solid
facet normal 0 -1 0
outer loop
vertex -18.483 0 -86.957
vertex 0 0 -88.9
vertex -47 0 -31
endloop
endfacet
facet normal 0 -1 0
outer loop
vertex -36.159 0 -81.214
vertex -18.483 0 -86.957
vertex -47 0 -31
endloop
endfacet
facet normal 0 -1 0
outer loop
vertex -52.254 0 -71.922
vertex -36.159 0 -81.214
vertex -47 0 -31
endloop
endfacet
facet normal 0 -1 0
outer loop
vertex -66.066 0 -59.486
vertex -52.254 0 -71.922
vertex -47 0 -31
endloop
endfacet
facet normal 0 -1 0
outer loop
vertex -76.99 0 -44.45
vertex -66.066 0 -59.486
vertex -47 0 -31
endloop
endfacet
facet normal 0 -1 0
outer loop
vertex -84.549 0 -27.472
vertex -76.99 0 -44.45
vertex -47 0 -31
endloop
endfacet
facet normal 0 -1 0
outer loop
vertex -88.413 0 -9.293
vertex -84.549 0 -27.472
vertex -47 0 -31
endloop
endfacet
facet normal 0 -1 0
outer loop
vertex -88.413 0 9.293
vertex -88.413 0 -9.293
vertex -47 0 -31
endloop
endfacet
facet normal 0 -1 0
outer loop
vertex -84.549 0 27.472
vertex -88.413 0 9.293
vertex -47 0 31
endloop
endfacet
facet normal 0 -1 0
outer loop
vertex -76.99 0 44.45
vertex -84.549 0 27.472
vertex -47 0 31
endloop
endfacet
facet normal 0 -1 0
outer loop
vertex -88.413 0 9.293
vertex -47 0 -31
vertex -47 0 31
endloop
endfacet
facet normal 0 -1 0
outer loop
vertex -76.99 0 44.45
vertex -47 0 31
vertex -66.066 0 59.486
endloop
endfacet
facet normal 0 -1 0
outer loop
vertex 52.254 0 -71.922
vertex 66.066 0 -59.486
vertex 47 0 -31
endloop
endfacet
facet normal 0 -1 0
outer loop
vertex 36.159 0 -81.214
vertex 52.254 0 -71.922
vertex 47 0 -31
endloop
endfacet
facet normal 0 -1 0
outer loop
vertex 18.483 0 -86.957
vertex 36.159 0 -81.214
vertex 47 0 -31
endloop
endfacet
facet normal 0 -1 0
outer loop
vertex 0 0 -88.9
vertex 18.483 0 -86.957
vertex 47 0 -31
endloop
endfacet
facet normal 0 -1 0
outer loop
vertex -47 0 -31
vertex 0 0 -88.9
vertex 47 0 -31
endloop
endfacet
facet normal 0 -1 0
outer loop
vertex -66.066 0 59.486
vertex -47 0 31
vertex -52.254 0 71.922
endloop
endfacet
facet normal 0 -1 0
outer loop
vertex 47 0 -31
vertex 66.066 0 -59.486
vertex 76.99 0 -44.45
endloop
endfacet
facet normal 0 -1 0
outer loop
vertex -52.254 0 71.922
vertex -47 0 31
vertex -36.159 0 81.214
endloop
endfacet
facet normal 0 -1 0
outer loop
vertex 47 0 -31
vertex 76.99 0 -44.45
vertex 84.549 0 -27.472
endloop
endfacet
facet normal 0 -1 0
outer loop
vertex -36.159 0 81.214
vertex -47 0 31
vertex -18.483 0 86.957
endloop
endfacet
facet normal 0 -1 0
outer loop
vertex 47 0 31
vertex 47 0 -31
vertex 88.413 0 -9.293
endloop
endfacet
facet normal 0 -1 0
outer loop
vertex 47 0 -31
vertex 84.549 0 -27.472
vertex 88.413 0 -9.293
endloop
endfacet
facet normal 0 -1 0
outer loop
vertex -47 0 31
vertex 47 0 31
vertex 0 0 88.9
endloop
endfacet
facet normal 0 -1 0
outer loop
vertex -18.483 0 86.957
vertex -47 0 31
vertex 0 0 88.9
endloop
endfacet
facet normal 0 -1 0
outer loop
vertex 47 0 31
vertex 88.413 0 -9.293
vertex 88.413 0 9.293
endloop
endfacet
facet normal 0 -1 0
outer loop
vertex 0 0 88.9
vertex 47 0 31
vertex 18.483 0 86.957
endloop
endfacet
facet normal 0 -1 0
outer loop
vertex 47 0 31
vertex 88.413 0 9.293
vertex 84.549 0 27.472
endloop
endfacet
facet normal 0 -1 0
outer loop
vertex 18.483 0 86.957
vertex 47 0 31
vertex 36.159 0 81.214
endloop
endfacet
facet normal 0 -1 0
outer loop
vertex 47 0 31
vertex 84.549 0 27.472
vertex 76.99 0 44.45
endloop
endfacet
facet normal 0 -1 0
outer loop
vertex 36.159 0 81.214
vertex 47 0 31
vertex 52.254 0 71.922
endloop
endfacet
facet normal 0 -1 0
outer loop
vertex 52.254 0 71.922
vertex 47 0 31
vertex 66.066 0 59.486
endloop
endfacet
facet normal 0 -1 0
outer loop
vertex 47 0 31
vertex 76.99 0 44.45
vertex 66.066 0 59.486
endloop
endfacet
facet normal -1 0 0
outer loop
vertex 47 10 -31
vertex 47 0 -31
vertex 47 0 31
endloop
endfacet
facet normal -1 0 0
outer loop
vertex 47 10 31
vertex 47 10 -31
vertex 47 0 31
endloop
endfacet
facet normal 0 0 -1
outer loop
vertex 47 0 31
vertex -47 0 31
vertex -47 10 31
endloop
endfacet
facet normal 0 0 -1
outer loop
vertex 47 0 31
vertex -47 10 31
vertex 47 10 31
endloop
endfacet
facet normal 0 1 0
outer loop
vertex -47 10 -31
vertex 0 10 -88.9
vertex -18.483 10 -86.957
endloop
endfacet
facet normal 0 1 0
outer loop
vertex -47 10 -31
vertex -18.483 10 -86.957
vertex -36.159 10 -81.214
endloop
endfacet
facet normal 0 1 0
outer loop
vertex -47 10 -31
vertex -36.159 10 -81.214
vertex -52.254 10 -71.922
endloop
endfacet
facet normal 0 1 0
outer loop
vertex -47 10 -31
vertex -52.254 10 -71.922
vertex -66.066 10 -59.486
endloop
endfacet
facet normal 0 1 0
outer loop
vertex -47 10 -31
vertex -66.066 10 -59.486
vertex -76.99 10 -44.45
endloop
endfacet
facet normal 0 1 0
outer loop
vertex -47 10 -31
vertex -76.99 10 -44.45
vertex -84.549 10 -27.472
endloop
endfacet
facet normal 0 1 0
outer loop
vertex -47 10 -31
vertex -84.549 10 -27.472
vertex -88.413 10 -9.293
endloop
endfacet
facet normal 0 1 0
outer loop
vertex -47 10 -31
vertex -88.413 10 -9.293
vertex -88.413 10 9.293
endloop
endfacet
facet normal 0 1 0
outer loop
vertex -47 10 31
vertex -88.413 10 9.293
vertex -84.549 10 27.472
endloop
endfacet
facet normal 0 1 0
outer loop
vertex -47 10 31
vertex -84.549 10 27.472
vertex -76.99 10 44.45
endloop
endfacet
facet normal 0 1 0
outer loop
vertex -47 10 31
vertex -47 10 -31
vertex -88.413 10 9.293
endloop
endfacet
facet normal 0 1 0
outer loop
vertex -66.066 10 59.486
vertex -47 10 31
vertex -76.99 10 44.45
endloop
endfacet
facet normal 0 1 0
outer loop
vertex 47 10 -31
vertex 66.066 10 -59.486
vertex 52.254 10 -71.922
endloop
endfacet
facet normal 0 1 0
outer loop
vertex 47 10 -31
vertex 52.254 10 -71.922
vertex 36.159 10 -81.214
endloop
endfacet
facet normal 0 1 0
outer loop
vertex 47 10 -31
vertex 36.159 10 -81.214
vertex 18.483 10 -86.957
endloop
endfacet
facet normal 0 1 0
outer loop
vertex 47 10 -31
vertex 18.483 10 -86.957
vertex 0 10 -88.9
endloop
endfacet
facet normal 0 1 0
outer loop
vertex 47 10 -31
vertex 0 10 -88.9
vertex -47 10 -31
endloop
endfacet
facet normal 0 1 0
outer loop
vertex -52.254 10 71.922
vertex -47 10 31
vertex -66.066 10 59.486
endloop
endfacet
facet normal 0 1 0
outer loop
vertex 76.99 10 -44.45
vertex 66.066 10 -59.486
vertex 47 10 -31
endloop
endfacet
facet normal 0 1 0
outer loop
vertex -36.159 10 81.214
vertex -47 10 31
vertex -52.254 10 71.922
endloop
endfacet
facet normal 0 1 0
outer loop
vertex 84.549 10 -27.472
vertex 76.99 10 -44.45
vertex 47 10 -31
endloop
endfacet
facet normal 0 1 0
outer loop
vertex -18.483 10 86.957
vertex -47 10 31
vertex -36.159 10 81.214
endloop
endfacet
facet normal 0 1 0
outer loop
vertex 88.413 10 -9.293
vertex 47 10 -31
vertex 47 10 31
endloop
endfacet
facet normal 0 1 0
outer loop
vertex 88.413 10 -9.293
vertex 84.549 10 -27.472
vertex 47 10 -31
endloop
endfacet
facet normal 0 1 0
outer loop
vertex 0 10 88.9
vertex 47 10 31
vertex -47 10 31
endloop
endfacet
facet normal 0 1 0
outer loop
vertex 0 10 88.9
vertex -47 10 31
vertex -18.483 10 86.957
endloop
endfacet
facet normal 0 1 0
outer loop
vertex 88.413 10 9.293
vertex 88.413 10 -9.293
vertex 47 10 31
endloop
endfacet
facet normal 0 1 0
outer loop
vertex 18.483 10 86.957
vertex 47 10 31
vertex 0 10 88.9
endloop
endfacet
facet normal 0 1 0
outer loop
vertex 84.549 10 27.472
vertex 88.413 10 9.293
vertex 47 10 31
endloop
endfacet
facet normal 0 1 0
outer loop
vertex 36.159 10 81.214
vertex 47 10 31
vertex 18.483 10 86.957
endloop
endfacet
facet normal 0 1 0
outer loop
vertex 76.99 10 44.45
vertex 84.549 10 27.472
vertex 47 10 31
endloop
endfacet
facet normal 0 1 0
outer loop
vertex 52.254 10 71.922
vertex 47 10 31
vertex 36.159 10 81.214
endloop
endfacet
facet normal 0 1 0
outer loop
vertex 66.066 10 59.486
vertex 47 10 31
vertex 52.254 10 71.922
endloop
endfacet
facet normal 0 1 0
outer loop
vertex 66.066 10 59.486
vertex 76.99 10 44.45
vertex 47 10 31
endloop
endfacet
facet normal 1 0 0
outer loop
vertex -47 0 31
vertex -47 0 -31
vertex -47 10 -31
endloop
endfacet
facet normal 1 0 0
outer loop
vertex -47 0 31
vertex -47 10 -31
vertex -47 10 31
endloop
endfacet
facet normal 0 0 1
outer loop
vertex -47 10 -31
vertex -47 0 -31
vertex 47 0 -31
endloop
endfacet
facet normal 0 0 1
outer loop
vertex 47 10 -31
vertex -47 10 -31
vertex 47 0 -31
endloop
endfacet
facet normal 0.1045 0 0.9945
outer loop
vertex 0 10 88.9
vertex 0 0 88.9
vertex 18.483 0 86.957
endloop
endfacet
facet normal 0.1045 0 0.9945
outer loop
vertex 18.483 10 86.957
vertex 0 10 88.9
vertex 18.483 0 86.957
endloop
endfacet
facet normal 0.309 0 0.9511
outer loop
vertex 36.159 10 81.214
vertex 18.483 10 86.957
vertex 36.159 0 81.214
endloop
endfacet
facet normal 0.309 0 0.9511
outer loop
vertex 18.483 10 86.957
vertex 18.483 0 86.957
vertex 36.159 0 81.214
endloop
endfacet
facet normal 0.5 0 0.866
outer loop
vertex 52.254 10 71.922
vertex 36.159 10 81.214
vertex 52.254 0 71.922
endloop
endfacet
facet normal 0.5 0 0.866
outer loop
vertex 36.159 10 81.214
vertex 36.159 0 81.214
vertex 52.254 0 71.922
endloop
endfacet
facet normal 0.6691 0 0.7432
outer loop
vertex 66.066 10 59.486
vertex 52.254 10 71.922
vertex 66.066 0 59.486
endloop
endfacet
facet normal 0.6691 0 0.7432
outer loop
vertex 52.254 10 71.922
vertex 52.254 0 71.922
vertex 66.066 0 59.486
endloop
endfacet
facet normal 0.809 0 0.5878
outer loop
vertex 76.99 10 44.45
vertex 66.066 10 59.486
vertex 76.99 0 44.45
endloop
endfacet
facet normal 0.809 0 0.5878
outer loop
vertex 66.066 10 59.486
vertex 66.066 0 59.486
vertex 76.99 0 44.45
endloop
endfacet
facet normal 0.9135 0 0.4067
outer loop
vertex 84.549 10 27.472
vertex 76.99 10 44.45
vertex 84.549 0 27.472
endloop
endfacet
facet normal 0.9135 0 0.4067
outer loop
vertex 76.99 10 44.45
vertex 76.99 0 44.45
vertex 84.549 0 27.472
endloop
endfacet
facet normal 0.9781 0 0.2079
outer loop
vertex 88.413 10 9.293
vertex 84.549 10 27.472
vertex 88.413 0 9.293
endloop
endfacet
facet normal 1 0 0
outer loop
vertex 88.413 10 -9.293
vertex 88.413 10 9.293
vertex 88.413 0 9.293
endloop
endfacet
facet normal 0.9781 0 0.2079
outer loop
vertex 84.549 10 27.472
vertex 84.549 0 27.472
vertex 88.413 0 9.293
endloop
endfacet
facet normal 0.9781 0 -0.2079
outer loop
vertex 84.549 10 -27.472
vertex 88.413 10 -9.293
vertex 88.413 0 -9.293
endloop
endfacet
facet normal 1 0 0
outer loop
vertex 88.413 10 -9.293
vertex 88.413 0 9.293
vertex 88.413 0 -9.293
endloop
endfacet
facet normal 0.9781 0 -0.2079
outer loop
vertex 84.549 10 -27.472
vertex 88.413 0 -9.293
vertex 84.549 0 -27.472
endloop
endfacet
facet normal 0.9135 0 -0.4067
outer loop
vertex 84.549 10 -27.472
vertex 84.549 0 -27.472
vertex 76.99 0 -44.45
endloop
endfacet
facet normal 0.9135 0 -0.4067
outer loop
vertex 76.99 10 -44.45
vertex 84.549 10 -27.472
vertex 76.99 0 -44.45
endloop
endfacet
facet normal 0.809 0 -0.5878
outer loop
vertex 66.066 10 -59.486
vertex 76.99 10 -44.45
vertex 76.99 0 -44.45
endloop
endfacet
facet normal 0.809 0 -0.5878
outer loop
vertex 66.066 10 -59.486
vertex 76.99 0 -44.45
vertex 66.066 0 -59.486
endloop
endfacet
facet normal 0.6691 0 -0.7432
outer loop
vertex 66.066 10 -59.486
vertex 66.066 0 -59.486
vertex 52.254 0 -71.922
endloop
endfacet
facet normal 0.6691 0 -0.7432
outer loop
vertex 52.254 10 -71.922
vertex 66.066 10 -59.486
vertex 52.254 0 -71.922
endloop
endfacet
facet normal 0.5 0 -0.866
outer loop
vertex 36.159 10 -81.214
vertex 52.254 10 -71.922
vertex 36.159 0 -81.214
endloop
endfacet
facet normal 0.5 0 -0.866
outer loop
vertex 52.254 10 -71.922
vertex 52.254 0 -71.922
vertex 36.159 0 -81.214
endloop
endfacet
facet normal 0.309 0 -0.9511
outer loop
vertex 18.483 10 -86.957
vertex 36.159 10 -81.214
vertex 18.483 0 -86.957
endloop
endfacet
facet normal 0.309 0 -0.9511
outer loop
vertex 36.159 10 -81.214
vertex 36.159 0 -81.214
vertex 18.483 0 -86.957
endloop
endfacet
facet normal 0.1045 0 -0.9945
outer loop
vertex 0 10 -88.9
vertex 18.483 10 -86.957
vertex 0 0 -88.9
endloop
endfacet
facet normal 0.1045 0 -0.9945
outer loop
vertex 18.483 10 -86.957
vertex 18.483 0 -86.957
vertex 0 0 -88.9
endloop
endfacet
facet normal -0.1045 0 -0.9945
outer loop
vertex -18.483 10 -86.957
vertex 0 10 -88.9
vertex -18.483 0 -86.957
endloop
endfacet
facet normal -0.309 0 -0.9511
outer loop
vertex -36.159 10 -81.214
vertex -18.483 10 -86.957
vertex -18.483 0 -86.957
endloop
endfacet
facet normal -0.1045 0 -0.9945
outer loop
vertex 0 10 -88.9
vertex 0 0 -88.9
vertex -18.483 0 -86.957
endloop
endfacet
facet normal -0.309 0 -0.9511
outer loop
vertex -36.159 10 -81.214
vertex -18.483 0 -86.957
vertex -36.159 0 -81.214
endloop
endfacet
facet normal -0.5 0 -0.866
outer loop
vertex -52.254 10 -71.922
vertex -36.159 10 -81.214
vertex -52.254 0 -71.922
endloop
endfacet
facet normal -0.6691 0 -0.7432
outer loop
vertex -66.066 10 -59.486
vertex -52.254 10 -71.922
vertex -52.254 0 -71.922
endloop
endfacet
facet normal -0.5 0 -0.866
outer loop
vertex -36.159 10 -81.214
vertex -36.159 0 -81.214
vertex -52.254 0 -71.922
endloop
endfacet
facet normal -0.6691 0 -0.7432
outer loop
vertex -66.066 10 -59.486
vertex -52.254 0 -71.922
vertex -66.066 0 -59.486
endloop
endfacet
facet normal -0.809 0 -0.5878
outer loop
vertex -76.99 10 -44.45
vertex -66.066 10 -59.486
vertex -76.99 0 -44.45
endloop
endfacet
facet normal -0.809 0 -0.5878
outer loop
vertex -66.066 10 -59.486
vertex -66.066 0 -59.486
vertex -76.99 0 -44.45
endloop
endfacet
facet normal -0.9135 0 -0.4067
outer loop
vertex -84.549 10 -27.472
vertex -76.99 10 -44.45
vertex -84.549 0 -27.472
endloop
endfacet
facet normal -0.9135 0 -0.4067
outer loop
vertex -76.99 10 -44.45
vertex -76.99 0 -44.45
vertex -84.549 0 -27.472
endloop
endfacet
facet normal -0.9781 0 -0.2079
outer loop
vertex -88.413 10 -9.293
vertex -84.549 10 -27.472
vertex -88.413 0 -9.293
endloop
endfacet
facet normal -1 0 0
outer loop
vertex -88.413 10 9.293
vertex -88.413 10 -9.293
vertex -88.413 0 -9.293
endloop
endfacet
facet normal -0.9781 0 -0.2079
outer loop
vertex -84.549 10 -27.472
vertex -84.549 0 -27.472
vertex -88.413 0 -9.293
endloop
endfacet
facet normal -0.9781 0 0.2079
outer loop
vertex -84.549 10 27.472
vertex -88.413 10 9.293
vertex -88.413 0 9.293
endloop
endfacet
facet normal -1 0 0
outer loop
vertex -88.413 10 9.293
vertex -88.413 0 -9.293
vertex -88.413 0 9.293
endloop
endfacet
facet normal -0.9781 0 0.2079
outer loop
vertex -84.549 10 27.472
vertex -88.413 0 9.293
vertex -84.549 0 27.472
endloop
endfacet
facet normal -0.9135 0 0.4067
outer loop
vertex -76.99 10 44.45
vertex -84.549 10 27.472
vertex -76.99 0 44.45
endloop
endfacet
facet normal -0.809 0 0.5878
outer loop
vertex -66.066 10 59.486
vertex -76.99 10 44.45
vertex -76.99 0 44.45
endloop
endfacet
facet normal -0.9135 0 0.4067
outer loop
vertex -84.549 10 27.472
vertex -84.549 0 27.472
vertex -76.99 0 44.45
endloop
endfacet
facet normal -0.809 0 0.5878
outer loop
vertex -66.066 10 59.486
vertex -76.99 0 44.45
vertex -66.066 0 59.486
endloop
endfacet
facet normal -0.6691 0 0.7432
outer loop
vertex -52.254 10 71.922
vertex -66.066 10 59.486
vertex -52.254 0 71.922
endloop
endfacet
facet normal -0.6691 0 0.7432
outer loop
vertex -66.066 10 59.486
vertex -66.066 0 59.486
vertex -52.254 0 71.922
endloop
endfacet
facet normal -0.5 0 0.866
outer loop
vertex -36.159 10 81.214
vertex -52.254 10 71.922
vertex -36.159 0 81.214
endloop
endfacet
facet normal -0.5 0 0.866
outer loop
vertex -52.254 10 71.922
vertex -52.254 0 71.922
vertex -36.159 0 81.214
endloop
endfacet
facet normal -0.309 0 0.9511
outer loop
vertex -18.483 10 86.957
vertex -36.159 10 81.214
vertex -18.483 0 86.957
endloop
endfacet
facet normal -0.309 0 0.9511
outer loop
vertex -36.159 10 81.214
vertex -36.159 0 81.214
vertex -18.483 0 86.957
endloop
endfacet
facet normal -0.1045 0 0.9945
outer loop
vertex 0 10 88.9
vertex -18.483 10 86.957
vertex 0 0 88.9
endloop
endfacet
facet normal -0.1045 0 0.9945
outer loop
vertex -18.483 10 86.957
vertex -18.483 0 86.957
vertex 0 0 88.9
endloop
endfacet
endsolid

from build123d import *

# Parameters (mm, degrees)
SKETCH1_R           = 88.9
BOSS_EXTRUDE1_DEPTH = 10
SKETCH2_W           = 94
SKETCH2_H           = 62
CUT_EXTRUDE1_DEPTH  = 30


with BuildPart() as part:
    # Sketch1 → Boss-Extrude1 (new body)
    with BuildSketch(Plane(origin=(0, 0, 0), x_dir=(1, 0, 0), z_dir=(0, 1, 0))):
        with Locations(Location((0, 0, 0), (0, 0, 270))):
            Circle(SKETCH1_R)
    extrude(amount=BOSS_EXTRUDE1_DEPTH)

    # Sketch2 → Cut-Extrude1 (cut)
    with BuildSketch(Plane.XZ.offset(10)):
        Rectangle(SKETCH2_W, SKETCH2_H)
    extrude(amount=-CUT_EXTRUDE1_DEPTH, mode=Mode.SUBTRACT)


solid = part.part
